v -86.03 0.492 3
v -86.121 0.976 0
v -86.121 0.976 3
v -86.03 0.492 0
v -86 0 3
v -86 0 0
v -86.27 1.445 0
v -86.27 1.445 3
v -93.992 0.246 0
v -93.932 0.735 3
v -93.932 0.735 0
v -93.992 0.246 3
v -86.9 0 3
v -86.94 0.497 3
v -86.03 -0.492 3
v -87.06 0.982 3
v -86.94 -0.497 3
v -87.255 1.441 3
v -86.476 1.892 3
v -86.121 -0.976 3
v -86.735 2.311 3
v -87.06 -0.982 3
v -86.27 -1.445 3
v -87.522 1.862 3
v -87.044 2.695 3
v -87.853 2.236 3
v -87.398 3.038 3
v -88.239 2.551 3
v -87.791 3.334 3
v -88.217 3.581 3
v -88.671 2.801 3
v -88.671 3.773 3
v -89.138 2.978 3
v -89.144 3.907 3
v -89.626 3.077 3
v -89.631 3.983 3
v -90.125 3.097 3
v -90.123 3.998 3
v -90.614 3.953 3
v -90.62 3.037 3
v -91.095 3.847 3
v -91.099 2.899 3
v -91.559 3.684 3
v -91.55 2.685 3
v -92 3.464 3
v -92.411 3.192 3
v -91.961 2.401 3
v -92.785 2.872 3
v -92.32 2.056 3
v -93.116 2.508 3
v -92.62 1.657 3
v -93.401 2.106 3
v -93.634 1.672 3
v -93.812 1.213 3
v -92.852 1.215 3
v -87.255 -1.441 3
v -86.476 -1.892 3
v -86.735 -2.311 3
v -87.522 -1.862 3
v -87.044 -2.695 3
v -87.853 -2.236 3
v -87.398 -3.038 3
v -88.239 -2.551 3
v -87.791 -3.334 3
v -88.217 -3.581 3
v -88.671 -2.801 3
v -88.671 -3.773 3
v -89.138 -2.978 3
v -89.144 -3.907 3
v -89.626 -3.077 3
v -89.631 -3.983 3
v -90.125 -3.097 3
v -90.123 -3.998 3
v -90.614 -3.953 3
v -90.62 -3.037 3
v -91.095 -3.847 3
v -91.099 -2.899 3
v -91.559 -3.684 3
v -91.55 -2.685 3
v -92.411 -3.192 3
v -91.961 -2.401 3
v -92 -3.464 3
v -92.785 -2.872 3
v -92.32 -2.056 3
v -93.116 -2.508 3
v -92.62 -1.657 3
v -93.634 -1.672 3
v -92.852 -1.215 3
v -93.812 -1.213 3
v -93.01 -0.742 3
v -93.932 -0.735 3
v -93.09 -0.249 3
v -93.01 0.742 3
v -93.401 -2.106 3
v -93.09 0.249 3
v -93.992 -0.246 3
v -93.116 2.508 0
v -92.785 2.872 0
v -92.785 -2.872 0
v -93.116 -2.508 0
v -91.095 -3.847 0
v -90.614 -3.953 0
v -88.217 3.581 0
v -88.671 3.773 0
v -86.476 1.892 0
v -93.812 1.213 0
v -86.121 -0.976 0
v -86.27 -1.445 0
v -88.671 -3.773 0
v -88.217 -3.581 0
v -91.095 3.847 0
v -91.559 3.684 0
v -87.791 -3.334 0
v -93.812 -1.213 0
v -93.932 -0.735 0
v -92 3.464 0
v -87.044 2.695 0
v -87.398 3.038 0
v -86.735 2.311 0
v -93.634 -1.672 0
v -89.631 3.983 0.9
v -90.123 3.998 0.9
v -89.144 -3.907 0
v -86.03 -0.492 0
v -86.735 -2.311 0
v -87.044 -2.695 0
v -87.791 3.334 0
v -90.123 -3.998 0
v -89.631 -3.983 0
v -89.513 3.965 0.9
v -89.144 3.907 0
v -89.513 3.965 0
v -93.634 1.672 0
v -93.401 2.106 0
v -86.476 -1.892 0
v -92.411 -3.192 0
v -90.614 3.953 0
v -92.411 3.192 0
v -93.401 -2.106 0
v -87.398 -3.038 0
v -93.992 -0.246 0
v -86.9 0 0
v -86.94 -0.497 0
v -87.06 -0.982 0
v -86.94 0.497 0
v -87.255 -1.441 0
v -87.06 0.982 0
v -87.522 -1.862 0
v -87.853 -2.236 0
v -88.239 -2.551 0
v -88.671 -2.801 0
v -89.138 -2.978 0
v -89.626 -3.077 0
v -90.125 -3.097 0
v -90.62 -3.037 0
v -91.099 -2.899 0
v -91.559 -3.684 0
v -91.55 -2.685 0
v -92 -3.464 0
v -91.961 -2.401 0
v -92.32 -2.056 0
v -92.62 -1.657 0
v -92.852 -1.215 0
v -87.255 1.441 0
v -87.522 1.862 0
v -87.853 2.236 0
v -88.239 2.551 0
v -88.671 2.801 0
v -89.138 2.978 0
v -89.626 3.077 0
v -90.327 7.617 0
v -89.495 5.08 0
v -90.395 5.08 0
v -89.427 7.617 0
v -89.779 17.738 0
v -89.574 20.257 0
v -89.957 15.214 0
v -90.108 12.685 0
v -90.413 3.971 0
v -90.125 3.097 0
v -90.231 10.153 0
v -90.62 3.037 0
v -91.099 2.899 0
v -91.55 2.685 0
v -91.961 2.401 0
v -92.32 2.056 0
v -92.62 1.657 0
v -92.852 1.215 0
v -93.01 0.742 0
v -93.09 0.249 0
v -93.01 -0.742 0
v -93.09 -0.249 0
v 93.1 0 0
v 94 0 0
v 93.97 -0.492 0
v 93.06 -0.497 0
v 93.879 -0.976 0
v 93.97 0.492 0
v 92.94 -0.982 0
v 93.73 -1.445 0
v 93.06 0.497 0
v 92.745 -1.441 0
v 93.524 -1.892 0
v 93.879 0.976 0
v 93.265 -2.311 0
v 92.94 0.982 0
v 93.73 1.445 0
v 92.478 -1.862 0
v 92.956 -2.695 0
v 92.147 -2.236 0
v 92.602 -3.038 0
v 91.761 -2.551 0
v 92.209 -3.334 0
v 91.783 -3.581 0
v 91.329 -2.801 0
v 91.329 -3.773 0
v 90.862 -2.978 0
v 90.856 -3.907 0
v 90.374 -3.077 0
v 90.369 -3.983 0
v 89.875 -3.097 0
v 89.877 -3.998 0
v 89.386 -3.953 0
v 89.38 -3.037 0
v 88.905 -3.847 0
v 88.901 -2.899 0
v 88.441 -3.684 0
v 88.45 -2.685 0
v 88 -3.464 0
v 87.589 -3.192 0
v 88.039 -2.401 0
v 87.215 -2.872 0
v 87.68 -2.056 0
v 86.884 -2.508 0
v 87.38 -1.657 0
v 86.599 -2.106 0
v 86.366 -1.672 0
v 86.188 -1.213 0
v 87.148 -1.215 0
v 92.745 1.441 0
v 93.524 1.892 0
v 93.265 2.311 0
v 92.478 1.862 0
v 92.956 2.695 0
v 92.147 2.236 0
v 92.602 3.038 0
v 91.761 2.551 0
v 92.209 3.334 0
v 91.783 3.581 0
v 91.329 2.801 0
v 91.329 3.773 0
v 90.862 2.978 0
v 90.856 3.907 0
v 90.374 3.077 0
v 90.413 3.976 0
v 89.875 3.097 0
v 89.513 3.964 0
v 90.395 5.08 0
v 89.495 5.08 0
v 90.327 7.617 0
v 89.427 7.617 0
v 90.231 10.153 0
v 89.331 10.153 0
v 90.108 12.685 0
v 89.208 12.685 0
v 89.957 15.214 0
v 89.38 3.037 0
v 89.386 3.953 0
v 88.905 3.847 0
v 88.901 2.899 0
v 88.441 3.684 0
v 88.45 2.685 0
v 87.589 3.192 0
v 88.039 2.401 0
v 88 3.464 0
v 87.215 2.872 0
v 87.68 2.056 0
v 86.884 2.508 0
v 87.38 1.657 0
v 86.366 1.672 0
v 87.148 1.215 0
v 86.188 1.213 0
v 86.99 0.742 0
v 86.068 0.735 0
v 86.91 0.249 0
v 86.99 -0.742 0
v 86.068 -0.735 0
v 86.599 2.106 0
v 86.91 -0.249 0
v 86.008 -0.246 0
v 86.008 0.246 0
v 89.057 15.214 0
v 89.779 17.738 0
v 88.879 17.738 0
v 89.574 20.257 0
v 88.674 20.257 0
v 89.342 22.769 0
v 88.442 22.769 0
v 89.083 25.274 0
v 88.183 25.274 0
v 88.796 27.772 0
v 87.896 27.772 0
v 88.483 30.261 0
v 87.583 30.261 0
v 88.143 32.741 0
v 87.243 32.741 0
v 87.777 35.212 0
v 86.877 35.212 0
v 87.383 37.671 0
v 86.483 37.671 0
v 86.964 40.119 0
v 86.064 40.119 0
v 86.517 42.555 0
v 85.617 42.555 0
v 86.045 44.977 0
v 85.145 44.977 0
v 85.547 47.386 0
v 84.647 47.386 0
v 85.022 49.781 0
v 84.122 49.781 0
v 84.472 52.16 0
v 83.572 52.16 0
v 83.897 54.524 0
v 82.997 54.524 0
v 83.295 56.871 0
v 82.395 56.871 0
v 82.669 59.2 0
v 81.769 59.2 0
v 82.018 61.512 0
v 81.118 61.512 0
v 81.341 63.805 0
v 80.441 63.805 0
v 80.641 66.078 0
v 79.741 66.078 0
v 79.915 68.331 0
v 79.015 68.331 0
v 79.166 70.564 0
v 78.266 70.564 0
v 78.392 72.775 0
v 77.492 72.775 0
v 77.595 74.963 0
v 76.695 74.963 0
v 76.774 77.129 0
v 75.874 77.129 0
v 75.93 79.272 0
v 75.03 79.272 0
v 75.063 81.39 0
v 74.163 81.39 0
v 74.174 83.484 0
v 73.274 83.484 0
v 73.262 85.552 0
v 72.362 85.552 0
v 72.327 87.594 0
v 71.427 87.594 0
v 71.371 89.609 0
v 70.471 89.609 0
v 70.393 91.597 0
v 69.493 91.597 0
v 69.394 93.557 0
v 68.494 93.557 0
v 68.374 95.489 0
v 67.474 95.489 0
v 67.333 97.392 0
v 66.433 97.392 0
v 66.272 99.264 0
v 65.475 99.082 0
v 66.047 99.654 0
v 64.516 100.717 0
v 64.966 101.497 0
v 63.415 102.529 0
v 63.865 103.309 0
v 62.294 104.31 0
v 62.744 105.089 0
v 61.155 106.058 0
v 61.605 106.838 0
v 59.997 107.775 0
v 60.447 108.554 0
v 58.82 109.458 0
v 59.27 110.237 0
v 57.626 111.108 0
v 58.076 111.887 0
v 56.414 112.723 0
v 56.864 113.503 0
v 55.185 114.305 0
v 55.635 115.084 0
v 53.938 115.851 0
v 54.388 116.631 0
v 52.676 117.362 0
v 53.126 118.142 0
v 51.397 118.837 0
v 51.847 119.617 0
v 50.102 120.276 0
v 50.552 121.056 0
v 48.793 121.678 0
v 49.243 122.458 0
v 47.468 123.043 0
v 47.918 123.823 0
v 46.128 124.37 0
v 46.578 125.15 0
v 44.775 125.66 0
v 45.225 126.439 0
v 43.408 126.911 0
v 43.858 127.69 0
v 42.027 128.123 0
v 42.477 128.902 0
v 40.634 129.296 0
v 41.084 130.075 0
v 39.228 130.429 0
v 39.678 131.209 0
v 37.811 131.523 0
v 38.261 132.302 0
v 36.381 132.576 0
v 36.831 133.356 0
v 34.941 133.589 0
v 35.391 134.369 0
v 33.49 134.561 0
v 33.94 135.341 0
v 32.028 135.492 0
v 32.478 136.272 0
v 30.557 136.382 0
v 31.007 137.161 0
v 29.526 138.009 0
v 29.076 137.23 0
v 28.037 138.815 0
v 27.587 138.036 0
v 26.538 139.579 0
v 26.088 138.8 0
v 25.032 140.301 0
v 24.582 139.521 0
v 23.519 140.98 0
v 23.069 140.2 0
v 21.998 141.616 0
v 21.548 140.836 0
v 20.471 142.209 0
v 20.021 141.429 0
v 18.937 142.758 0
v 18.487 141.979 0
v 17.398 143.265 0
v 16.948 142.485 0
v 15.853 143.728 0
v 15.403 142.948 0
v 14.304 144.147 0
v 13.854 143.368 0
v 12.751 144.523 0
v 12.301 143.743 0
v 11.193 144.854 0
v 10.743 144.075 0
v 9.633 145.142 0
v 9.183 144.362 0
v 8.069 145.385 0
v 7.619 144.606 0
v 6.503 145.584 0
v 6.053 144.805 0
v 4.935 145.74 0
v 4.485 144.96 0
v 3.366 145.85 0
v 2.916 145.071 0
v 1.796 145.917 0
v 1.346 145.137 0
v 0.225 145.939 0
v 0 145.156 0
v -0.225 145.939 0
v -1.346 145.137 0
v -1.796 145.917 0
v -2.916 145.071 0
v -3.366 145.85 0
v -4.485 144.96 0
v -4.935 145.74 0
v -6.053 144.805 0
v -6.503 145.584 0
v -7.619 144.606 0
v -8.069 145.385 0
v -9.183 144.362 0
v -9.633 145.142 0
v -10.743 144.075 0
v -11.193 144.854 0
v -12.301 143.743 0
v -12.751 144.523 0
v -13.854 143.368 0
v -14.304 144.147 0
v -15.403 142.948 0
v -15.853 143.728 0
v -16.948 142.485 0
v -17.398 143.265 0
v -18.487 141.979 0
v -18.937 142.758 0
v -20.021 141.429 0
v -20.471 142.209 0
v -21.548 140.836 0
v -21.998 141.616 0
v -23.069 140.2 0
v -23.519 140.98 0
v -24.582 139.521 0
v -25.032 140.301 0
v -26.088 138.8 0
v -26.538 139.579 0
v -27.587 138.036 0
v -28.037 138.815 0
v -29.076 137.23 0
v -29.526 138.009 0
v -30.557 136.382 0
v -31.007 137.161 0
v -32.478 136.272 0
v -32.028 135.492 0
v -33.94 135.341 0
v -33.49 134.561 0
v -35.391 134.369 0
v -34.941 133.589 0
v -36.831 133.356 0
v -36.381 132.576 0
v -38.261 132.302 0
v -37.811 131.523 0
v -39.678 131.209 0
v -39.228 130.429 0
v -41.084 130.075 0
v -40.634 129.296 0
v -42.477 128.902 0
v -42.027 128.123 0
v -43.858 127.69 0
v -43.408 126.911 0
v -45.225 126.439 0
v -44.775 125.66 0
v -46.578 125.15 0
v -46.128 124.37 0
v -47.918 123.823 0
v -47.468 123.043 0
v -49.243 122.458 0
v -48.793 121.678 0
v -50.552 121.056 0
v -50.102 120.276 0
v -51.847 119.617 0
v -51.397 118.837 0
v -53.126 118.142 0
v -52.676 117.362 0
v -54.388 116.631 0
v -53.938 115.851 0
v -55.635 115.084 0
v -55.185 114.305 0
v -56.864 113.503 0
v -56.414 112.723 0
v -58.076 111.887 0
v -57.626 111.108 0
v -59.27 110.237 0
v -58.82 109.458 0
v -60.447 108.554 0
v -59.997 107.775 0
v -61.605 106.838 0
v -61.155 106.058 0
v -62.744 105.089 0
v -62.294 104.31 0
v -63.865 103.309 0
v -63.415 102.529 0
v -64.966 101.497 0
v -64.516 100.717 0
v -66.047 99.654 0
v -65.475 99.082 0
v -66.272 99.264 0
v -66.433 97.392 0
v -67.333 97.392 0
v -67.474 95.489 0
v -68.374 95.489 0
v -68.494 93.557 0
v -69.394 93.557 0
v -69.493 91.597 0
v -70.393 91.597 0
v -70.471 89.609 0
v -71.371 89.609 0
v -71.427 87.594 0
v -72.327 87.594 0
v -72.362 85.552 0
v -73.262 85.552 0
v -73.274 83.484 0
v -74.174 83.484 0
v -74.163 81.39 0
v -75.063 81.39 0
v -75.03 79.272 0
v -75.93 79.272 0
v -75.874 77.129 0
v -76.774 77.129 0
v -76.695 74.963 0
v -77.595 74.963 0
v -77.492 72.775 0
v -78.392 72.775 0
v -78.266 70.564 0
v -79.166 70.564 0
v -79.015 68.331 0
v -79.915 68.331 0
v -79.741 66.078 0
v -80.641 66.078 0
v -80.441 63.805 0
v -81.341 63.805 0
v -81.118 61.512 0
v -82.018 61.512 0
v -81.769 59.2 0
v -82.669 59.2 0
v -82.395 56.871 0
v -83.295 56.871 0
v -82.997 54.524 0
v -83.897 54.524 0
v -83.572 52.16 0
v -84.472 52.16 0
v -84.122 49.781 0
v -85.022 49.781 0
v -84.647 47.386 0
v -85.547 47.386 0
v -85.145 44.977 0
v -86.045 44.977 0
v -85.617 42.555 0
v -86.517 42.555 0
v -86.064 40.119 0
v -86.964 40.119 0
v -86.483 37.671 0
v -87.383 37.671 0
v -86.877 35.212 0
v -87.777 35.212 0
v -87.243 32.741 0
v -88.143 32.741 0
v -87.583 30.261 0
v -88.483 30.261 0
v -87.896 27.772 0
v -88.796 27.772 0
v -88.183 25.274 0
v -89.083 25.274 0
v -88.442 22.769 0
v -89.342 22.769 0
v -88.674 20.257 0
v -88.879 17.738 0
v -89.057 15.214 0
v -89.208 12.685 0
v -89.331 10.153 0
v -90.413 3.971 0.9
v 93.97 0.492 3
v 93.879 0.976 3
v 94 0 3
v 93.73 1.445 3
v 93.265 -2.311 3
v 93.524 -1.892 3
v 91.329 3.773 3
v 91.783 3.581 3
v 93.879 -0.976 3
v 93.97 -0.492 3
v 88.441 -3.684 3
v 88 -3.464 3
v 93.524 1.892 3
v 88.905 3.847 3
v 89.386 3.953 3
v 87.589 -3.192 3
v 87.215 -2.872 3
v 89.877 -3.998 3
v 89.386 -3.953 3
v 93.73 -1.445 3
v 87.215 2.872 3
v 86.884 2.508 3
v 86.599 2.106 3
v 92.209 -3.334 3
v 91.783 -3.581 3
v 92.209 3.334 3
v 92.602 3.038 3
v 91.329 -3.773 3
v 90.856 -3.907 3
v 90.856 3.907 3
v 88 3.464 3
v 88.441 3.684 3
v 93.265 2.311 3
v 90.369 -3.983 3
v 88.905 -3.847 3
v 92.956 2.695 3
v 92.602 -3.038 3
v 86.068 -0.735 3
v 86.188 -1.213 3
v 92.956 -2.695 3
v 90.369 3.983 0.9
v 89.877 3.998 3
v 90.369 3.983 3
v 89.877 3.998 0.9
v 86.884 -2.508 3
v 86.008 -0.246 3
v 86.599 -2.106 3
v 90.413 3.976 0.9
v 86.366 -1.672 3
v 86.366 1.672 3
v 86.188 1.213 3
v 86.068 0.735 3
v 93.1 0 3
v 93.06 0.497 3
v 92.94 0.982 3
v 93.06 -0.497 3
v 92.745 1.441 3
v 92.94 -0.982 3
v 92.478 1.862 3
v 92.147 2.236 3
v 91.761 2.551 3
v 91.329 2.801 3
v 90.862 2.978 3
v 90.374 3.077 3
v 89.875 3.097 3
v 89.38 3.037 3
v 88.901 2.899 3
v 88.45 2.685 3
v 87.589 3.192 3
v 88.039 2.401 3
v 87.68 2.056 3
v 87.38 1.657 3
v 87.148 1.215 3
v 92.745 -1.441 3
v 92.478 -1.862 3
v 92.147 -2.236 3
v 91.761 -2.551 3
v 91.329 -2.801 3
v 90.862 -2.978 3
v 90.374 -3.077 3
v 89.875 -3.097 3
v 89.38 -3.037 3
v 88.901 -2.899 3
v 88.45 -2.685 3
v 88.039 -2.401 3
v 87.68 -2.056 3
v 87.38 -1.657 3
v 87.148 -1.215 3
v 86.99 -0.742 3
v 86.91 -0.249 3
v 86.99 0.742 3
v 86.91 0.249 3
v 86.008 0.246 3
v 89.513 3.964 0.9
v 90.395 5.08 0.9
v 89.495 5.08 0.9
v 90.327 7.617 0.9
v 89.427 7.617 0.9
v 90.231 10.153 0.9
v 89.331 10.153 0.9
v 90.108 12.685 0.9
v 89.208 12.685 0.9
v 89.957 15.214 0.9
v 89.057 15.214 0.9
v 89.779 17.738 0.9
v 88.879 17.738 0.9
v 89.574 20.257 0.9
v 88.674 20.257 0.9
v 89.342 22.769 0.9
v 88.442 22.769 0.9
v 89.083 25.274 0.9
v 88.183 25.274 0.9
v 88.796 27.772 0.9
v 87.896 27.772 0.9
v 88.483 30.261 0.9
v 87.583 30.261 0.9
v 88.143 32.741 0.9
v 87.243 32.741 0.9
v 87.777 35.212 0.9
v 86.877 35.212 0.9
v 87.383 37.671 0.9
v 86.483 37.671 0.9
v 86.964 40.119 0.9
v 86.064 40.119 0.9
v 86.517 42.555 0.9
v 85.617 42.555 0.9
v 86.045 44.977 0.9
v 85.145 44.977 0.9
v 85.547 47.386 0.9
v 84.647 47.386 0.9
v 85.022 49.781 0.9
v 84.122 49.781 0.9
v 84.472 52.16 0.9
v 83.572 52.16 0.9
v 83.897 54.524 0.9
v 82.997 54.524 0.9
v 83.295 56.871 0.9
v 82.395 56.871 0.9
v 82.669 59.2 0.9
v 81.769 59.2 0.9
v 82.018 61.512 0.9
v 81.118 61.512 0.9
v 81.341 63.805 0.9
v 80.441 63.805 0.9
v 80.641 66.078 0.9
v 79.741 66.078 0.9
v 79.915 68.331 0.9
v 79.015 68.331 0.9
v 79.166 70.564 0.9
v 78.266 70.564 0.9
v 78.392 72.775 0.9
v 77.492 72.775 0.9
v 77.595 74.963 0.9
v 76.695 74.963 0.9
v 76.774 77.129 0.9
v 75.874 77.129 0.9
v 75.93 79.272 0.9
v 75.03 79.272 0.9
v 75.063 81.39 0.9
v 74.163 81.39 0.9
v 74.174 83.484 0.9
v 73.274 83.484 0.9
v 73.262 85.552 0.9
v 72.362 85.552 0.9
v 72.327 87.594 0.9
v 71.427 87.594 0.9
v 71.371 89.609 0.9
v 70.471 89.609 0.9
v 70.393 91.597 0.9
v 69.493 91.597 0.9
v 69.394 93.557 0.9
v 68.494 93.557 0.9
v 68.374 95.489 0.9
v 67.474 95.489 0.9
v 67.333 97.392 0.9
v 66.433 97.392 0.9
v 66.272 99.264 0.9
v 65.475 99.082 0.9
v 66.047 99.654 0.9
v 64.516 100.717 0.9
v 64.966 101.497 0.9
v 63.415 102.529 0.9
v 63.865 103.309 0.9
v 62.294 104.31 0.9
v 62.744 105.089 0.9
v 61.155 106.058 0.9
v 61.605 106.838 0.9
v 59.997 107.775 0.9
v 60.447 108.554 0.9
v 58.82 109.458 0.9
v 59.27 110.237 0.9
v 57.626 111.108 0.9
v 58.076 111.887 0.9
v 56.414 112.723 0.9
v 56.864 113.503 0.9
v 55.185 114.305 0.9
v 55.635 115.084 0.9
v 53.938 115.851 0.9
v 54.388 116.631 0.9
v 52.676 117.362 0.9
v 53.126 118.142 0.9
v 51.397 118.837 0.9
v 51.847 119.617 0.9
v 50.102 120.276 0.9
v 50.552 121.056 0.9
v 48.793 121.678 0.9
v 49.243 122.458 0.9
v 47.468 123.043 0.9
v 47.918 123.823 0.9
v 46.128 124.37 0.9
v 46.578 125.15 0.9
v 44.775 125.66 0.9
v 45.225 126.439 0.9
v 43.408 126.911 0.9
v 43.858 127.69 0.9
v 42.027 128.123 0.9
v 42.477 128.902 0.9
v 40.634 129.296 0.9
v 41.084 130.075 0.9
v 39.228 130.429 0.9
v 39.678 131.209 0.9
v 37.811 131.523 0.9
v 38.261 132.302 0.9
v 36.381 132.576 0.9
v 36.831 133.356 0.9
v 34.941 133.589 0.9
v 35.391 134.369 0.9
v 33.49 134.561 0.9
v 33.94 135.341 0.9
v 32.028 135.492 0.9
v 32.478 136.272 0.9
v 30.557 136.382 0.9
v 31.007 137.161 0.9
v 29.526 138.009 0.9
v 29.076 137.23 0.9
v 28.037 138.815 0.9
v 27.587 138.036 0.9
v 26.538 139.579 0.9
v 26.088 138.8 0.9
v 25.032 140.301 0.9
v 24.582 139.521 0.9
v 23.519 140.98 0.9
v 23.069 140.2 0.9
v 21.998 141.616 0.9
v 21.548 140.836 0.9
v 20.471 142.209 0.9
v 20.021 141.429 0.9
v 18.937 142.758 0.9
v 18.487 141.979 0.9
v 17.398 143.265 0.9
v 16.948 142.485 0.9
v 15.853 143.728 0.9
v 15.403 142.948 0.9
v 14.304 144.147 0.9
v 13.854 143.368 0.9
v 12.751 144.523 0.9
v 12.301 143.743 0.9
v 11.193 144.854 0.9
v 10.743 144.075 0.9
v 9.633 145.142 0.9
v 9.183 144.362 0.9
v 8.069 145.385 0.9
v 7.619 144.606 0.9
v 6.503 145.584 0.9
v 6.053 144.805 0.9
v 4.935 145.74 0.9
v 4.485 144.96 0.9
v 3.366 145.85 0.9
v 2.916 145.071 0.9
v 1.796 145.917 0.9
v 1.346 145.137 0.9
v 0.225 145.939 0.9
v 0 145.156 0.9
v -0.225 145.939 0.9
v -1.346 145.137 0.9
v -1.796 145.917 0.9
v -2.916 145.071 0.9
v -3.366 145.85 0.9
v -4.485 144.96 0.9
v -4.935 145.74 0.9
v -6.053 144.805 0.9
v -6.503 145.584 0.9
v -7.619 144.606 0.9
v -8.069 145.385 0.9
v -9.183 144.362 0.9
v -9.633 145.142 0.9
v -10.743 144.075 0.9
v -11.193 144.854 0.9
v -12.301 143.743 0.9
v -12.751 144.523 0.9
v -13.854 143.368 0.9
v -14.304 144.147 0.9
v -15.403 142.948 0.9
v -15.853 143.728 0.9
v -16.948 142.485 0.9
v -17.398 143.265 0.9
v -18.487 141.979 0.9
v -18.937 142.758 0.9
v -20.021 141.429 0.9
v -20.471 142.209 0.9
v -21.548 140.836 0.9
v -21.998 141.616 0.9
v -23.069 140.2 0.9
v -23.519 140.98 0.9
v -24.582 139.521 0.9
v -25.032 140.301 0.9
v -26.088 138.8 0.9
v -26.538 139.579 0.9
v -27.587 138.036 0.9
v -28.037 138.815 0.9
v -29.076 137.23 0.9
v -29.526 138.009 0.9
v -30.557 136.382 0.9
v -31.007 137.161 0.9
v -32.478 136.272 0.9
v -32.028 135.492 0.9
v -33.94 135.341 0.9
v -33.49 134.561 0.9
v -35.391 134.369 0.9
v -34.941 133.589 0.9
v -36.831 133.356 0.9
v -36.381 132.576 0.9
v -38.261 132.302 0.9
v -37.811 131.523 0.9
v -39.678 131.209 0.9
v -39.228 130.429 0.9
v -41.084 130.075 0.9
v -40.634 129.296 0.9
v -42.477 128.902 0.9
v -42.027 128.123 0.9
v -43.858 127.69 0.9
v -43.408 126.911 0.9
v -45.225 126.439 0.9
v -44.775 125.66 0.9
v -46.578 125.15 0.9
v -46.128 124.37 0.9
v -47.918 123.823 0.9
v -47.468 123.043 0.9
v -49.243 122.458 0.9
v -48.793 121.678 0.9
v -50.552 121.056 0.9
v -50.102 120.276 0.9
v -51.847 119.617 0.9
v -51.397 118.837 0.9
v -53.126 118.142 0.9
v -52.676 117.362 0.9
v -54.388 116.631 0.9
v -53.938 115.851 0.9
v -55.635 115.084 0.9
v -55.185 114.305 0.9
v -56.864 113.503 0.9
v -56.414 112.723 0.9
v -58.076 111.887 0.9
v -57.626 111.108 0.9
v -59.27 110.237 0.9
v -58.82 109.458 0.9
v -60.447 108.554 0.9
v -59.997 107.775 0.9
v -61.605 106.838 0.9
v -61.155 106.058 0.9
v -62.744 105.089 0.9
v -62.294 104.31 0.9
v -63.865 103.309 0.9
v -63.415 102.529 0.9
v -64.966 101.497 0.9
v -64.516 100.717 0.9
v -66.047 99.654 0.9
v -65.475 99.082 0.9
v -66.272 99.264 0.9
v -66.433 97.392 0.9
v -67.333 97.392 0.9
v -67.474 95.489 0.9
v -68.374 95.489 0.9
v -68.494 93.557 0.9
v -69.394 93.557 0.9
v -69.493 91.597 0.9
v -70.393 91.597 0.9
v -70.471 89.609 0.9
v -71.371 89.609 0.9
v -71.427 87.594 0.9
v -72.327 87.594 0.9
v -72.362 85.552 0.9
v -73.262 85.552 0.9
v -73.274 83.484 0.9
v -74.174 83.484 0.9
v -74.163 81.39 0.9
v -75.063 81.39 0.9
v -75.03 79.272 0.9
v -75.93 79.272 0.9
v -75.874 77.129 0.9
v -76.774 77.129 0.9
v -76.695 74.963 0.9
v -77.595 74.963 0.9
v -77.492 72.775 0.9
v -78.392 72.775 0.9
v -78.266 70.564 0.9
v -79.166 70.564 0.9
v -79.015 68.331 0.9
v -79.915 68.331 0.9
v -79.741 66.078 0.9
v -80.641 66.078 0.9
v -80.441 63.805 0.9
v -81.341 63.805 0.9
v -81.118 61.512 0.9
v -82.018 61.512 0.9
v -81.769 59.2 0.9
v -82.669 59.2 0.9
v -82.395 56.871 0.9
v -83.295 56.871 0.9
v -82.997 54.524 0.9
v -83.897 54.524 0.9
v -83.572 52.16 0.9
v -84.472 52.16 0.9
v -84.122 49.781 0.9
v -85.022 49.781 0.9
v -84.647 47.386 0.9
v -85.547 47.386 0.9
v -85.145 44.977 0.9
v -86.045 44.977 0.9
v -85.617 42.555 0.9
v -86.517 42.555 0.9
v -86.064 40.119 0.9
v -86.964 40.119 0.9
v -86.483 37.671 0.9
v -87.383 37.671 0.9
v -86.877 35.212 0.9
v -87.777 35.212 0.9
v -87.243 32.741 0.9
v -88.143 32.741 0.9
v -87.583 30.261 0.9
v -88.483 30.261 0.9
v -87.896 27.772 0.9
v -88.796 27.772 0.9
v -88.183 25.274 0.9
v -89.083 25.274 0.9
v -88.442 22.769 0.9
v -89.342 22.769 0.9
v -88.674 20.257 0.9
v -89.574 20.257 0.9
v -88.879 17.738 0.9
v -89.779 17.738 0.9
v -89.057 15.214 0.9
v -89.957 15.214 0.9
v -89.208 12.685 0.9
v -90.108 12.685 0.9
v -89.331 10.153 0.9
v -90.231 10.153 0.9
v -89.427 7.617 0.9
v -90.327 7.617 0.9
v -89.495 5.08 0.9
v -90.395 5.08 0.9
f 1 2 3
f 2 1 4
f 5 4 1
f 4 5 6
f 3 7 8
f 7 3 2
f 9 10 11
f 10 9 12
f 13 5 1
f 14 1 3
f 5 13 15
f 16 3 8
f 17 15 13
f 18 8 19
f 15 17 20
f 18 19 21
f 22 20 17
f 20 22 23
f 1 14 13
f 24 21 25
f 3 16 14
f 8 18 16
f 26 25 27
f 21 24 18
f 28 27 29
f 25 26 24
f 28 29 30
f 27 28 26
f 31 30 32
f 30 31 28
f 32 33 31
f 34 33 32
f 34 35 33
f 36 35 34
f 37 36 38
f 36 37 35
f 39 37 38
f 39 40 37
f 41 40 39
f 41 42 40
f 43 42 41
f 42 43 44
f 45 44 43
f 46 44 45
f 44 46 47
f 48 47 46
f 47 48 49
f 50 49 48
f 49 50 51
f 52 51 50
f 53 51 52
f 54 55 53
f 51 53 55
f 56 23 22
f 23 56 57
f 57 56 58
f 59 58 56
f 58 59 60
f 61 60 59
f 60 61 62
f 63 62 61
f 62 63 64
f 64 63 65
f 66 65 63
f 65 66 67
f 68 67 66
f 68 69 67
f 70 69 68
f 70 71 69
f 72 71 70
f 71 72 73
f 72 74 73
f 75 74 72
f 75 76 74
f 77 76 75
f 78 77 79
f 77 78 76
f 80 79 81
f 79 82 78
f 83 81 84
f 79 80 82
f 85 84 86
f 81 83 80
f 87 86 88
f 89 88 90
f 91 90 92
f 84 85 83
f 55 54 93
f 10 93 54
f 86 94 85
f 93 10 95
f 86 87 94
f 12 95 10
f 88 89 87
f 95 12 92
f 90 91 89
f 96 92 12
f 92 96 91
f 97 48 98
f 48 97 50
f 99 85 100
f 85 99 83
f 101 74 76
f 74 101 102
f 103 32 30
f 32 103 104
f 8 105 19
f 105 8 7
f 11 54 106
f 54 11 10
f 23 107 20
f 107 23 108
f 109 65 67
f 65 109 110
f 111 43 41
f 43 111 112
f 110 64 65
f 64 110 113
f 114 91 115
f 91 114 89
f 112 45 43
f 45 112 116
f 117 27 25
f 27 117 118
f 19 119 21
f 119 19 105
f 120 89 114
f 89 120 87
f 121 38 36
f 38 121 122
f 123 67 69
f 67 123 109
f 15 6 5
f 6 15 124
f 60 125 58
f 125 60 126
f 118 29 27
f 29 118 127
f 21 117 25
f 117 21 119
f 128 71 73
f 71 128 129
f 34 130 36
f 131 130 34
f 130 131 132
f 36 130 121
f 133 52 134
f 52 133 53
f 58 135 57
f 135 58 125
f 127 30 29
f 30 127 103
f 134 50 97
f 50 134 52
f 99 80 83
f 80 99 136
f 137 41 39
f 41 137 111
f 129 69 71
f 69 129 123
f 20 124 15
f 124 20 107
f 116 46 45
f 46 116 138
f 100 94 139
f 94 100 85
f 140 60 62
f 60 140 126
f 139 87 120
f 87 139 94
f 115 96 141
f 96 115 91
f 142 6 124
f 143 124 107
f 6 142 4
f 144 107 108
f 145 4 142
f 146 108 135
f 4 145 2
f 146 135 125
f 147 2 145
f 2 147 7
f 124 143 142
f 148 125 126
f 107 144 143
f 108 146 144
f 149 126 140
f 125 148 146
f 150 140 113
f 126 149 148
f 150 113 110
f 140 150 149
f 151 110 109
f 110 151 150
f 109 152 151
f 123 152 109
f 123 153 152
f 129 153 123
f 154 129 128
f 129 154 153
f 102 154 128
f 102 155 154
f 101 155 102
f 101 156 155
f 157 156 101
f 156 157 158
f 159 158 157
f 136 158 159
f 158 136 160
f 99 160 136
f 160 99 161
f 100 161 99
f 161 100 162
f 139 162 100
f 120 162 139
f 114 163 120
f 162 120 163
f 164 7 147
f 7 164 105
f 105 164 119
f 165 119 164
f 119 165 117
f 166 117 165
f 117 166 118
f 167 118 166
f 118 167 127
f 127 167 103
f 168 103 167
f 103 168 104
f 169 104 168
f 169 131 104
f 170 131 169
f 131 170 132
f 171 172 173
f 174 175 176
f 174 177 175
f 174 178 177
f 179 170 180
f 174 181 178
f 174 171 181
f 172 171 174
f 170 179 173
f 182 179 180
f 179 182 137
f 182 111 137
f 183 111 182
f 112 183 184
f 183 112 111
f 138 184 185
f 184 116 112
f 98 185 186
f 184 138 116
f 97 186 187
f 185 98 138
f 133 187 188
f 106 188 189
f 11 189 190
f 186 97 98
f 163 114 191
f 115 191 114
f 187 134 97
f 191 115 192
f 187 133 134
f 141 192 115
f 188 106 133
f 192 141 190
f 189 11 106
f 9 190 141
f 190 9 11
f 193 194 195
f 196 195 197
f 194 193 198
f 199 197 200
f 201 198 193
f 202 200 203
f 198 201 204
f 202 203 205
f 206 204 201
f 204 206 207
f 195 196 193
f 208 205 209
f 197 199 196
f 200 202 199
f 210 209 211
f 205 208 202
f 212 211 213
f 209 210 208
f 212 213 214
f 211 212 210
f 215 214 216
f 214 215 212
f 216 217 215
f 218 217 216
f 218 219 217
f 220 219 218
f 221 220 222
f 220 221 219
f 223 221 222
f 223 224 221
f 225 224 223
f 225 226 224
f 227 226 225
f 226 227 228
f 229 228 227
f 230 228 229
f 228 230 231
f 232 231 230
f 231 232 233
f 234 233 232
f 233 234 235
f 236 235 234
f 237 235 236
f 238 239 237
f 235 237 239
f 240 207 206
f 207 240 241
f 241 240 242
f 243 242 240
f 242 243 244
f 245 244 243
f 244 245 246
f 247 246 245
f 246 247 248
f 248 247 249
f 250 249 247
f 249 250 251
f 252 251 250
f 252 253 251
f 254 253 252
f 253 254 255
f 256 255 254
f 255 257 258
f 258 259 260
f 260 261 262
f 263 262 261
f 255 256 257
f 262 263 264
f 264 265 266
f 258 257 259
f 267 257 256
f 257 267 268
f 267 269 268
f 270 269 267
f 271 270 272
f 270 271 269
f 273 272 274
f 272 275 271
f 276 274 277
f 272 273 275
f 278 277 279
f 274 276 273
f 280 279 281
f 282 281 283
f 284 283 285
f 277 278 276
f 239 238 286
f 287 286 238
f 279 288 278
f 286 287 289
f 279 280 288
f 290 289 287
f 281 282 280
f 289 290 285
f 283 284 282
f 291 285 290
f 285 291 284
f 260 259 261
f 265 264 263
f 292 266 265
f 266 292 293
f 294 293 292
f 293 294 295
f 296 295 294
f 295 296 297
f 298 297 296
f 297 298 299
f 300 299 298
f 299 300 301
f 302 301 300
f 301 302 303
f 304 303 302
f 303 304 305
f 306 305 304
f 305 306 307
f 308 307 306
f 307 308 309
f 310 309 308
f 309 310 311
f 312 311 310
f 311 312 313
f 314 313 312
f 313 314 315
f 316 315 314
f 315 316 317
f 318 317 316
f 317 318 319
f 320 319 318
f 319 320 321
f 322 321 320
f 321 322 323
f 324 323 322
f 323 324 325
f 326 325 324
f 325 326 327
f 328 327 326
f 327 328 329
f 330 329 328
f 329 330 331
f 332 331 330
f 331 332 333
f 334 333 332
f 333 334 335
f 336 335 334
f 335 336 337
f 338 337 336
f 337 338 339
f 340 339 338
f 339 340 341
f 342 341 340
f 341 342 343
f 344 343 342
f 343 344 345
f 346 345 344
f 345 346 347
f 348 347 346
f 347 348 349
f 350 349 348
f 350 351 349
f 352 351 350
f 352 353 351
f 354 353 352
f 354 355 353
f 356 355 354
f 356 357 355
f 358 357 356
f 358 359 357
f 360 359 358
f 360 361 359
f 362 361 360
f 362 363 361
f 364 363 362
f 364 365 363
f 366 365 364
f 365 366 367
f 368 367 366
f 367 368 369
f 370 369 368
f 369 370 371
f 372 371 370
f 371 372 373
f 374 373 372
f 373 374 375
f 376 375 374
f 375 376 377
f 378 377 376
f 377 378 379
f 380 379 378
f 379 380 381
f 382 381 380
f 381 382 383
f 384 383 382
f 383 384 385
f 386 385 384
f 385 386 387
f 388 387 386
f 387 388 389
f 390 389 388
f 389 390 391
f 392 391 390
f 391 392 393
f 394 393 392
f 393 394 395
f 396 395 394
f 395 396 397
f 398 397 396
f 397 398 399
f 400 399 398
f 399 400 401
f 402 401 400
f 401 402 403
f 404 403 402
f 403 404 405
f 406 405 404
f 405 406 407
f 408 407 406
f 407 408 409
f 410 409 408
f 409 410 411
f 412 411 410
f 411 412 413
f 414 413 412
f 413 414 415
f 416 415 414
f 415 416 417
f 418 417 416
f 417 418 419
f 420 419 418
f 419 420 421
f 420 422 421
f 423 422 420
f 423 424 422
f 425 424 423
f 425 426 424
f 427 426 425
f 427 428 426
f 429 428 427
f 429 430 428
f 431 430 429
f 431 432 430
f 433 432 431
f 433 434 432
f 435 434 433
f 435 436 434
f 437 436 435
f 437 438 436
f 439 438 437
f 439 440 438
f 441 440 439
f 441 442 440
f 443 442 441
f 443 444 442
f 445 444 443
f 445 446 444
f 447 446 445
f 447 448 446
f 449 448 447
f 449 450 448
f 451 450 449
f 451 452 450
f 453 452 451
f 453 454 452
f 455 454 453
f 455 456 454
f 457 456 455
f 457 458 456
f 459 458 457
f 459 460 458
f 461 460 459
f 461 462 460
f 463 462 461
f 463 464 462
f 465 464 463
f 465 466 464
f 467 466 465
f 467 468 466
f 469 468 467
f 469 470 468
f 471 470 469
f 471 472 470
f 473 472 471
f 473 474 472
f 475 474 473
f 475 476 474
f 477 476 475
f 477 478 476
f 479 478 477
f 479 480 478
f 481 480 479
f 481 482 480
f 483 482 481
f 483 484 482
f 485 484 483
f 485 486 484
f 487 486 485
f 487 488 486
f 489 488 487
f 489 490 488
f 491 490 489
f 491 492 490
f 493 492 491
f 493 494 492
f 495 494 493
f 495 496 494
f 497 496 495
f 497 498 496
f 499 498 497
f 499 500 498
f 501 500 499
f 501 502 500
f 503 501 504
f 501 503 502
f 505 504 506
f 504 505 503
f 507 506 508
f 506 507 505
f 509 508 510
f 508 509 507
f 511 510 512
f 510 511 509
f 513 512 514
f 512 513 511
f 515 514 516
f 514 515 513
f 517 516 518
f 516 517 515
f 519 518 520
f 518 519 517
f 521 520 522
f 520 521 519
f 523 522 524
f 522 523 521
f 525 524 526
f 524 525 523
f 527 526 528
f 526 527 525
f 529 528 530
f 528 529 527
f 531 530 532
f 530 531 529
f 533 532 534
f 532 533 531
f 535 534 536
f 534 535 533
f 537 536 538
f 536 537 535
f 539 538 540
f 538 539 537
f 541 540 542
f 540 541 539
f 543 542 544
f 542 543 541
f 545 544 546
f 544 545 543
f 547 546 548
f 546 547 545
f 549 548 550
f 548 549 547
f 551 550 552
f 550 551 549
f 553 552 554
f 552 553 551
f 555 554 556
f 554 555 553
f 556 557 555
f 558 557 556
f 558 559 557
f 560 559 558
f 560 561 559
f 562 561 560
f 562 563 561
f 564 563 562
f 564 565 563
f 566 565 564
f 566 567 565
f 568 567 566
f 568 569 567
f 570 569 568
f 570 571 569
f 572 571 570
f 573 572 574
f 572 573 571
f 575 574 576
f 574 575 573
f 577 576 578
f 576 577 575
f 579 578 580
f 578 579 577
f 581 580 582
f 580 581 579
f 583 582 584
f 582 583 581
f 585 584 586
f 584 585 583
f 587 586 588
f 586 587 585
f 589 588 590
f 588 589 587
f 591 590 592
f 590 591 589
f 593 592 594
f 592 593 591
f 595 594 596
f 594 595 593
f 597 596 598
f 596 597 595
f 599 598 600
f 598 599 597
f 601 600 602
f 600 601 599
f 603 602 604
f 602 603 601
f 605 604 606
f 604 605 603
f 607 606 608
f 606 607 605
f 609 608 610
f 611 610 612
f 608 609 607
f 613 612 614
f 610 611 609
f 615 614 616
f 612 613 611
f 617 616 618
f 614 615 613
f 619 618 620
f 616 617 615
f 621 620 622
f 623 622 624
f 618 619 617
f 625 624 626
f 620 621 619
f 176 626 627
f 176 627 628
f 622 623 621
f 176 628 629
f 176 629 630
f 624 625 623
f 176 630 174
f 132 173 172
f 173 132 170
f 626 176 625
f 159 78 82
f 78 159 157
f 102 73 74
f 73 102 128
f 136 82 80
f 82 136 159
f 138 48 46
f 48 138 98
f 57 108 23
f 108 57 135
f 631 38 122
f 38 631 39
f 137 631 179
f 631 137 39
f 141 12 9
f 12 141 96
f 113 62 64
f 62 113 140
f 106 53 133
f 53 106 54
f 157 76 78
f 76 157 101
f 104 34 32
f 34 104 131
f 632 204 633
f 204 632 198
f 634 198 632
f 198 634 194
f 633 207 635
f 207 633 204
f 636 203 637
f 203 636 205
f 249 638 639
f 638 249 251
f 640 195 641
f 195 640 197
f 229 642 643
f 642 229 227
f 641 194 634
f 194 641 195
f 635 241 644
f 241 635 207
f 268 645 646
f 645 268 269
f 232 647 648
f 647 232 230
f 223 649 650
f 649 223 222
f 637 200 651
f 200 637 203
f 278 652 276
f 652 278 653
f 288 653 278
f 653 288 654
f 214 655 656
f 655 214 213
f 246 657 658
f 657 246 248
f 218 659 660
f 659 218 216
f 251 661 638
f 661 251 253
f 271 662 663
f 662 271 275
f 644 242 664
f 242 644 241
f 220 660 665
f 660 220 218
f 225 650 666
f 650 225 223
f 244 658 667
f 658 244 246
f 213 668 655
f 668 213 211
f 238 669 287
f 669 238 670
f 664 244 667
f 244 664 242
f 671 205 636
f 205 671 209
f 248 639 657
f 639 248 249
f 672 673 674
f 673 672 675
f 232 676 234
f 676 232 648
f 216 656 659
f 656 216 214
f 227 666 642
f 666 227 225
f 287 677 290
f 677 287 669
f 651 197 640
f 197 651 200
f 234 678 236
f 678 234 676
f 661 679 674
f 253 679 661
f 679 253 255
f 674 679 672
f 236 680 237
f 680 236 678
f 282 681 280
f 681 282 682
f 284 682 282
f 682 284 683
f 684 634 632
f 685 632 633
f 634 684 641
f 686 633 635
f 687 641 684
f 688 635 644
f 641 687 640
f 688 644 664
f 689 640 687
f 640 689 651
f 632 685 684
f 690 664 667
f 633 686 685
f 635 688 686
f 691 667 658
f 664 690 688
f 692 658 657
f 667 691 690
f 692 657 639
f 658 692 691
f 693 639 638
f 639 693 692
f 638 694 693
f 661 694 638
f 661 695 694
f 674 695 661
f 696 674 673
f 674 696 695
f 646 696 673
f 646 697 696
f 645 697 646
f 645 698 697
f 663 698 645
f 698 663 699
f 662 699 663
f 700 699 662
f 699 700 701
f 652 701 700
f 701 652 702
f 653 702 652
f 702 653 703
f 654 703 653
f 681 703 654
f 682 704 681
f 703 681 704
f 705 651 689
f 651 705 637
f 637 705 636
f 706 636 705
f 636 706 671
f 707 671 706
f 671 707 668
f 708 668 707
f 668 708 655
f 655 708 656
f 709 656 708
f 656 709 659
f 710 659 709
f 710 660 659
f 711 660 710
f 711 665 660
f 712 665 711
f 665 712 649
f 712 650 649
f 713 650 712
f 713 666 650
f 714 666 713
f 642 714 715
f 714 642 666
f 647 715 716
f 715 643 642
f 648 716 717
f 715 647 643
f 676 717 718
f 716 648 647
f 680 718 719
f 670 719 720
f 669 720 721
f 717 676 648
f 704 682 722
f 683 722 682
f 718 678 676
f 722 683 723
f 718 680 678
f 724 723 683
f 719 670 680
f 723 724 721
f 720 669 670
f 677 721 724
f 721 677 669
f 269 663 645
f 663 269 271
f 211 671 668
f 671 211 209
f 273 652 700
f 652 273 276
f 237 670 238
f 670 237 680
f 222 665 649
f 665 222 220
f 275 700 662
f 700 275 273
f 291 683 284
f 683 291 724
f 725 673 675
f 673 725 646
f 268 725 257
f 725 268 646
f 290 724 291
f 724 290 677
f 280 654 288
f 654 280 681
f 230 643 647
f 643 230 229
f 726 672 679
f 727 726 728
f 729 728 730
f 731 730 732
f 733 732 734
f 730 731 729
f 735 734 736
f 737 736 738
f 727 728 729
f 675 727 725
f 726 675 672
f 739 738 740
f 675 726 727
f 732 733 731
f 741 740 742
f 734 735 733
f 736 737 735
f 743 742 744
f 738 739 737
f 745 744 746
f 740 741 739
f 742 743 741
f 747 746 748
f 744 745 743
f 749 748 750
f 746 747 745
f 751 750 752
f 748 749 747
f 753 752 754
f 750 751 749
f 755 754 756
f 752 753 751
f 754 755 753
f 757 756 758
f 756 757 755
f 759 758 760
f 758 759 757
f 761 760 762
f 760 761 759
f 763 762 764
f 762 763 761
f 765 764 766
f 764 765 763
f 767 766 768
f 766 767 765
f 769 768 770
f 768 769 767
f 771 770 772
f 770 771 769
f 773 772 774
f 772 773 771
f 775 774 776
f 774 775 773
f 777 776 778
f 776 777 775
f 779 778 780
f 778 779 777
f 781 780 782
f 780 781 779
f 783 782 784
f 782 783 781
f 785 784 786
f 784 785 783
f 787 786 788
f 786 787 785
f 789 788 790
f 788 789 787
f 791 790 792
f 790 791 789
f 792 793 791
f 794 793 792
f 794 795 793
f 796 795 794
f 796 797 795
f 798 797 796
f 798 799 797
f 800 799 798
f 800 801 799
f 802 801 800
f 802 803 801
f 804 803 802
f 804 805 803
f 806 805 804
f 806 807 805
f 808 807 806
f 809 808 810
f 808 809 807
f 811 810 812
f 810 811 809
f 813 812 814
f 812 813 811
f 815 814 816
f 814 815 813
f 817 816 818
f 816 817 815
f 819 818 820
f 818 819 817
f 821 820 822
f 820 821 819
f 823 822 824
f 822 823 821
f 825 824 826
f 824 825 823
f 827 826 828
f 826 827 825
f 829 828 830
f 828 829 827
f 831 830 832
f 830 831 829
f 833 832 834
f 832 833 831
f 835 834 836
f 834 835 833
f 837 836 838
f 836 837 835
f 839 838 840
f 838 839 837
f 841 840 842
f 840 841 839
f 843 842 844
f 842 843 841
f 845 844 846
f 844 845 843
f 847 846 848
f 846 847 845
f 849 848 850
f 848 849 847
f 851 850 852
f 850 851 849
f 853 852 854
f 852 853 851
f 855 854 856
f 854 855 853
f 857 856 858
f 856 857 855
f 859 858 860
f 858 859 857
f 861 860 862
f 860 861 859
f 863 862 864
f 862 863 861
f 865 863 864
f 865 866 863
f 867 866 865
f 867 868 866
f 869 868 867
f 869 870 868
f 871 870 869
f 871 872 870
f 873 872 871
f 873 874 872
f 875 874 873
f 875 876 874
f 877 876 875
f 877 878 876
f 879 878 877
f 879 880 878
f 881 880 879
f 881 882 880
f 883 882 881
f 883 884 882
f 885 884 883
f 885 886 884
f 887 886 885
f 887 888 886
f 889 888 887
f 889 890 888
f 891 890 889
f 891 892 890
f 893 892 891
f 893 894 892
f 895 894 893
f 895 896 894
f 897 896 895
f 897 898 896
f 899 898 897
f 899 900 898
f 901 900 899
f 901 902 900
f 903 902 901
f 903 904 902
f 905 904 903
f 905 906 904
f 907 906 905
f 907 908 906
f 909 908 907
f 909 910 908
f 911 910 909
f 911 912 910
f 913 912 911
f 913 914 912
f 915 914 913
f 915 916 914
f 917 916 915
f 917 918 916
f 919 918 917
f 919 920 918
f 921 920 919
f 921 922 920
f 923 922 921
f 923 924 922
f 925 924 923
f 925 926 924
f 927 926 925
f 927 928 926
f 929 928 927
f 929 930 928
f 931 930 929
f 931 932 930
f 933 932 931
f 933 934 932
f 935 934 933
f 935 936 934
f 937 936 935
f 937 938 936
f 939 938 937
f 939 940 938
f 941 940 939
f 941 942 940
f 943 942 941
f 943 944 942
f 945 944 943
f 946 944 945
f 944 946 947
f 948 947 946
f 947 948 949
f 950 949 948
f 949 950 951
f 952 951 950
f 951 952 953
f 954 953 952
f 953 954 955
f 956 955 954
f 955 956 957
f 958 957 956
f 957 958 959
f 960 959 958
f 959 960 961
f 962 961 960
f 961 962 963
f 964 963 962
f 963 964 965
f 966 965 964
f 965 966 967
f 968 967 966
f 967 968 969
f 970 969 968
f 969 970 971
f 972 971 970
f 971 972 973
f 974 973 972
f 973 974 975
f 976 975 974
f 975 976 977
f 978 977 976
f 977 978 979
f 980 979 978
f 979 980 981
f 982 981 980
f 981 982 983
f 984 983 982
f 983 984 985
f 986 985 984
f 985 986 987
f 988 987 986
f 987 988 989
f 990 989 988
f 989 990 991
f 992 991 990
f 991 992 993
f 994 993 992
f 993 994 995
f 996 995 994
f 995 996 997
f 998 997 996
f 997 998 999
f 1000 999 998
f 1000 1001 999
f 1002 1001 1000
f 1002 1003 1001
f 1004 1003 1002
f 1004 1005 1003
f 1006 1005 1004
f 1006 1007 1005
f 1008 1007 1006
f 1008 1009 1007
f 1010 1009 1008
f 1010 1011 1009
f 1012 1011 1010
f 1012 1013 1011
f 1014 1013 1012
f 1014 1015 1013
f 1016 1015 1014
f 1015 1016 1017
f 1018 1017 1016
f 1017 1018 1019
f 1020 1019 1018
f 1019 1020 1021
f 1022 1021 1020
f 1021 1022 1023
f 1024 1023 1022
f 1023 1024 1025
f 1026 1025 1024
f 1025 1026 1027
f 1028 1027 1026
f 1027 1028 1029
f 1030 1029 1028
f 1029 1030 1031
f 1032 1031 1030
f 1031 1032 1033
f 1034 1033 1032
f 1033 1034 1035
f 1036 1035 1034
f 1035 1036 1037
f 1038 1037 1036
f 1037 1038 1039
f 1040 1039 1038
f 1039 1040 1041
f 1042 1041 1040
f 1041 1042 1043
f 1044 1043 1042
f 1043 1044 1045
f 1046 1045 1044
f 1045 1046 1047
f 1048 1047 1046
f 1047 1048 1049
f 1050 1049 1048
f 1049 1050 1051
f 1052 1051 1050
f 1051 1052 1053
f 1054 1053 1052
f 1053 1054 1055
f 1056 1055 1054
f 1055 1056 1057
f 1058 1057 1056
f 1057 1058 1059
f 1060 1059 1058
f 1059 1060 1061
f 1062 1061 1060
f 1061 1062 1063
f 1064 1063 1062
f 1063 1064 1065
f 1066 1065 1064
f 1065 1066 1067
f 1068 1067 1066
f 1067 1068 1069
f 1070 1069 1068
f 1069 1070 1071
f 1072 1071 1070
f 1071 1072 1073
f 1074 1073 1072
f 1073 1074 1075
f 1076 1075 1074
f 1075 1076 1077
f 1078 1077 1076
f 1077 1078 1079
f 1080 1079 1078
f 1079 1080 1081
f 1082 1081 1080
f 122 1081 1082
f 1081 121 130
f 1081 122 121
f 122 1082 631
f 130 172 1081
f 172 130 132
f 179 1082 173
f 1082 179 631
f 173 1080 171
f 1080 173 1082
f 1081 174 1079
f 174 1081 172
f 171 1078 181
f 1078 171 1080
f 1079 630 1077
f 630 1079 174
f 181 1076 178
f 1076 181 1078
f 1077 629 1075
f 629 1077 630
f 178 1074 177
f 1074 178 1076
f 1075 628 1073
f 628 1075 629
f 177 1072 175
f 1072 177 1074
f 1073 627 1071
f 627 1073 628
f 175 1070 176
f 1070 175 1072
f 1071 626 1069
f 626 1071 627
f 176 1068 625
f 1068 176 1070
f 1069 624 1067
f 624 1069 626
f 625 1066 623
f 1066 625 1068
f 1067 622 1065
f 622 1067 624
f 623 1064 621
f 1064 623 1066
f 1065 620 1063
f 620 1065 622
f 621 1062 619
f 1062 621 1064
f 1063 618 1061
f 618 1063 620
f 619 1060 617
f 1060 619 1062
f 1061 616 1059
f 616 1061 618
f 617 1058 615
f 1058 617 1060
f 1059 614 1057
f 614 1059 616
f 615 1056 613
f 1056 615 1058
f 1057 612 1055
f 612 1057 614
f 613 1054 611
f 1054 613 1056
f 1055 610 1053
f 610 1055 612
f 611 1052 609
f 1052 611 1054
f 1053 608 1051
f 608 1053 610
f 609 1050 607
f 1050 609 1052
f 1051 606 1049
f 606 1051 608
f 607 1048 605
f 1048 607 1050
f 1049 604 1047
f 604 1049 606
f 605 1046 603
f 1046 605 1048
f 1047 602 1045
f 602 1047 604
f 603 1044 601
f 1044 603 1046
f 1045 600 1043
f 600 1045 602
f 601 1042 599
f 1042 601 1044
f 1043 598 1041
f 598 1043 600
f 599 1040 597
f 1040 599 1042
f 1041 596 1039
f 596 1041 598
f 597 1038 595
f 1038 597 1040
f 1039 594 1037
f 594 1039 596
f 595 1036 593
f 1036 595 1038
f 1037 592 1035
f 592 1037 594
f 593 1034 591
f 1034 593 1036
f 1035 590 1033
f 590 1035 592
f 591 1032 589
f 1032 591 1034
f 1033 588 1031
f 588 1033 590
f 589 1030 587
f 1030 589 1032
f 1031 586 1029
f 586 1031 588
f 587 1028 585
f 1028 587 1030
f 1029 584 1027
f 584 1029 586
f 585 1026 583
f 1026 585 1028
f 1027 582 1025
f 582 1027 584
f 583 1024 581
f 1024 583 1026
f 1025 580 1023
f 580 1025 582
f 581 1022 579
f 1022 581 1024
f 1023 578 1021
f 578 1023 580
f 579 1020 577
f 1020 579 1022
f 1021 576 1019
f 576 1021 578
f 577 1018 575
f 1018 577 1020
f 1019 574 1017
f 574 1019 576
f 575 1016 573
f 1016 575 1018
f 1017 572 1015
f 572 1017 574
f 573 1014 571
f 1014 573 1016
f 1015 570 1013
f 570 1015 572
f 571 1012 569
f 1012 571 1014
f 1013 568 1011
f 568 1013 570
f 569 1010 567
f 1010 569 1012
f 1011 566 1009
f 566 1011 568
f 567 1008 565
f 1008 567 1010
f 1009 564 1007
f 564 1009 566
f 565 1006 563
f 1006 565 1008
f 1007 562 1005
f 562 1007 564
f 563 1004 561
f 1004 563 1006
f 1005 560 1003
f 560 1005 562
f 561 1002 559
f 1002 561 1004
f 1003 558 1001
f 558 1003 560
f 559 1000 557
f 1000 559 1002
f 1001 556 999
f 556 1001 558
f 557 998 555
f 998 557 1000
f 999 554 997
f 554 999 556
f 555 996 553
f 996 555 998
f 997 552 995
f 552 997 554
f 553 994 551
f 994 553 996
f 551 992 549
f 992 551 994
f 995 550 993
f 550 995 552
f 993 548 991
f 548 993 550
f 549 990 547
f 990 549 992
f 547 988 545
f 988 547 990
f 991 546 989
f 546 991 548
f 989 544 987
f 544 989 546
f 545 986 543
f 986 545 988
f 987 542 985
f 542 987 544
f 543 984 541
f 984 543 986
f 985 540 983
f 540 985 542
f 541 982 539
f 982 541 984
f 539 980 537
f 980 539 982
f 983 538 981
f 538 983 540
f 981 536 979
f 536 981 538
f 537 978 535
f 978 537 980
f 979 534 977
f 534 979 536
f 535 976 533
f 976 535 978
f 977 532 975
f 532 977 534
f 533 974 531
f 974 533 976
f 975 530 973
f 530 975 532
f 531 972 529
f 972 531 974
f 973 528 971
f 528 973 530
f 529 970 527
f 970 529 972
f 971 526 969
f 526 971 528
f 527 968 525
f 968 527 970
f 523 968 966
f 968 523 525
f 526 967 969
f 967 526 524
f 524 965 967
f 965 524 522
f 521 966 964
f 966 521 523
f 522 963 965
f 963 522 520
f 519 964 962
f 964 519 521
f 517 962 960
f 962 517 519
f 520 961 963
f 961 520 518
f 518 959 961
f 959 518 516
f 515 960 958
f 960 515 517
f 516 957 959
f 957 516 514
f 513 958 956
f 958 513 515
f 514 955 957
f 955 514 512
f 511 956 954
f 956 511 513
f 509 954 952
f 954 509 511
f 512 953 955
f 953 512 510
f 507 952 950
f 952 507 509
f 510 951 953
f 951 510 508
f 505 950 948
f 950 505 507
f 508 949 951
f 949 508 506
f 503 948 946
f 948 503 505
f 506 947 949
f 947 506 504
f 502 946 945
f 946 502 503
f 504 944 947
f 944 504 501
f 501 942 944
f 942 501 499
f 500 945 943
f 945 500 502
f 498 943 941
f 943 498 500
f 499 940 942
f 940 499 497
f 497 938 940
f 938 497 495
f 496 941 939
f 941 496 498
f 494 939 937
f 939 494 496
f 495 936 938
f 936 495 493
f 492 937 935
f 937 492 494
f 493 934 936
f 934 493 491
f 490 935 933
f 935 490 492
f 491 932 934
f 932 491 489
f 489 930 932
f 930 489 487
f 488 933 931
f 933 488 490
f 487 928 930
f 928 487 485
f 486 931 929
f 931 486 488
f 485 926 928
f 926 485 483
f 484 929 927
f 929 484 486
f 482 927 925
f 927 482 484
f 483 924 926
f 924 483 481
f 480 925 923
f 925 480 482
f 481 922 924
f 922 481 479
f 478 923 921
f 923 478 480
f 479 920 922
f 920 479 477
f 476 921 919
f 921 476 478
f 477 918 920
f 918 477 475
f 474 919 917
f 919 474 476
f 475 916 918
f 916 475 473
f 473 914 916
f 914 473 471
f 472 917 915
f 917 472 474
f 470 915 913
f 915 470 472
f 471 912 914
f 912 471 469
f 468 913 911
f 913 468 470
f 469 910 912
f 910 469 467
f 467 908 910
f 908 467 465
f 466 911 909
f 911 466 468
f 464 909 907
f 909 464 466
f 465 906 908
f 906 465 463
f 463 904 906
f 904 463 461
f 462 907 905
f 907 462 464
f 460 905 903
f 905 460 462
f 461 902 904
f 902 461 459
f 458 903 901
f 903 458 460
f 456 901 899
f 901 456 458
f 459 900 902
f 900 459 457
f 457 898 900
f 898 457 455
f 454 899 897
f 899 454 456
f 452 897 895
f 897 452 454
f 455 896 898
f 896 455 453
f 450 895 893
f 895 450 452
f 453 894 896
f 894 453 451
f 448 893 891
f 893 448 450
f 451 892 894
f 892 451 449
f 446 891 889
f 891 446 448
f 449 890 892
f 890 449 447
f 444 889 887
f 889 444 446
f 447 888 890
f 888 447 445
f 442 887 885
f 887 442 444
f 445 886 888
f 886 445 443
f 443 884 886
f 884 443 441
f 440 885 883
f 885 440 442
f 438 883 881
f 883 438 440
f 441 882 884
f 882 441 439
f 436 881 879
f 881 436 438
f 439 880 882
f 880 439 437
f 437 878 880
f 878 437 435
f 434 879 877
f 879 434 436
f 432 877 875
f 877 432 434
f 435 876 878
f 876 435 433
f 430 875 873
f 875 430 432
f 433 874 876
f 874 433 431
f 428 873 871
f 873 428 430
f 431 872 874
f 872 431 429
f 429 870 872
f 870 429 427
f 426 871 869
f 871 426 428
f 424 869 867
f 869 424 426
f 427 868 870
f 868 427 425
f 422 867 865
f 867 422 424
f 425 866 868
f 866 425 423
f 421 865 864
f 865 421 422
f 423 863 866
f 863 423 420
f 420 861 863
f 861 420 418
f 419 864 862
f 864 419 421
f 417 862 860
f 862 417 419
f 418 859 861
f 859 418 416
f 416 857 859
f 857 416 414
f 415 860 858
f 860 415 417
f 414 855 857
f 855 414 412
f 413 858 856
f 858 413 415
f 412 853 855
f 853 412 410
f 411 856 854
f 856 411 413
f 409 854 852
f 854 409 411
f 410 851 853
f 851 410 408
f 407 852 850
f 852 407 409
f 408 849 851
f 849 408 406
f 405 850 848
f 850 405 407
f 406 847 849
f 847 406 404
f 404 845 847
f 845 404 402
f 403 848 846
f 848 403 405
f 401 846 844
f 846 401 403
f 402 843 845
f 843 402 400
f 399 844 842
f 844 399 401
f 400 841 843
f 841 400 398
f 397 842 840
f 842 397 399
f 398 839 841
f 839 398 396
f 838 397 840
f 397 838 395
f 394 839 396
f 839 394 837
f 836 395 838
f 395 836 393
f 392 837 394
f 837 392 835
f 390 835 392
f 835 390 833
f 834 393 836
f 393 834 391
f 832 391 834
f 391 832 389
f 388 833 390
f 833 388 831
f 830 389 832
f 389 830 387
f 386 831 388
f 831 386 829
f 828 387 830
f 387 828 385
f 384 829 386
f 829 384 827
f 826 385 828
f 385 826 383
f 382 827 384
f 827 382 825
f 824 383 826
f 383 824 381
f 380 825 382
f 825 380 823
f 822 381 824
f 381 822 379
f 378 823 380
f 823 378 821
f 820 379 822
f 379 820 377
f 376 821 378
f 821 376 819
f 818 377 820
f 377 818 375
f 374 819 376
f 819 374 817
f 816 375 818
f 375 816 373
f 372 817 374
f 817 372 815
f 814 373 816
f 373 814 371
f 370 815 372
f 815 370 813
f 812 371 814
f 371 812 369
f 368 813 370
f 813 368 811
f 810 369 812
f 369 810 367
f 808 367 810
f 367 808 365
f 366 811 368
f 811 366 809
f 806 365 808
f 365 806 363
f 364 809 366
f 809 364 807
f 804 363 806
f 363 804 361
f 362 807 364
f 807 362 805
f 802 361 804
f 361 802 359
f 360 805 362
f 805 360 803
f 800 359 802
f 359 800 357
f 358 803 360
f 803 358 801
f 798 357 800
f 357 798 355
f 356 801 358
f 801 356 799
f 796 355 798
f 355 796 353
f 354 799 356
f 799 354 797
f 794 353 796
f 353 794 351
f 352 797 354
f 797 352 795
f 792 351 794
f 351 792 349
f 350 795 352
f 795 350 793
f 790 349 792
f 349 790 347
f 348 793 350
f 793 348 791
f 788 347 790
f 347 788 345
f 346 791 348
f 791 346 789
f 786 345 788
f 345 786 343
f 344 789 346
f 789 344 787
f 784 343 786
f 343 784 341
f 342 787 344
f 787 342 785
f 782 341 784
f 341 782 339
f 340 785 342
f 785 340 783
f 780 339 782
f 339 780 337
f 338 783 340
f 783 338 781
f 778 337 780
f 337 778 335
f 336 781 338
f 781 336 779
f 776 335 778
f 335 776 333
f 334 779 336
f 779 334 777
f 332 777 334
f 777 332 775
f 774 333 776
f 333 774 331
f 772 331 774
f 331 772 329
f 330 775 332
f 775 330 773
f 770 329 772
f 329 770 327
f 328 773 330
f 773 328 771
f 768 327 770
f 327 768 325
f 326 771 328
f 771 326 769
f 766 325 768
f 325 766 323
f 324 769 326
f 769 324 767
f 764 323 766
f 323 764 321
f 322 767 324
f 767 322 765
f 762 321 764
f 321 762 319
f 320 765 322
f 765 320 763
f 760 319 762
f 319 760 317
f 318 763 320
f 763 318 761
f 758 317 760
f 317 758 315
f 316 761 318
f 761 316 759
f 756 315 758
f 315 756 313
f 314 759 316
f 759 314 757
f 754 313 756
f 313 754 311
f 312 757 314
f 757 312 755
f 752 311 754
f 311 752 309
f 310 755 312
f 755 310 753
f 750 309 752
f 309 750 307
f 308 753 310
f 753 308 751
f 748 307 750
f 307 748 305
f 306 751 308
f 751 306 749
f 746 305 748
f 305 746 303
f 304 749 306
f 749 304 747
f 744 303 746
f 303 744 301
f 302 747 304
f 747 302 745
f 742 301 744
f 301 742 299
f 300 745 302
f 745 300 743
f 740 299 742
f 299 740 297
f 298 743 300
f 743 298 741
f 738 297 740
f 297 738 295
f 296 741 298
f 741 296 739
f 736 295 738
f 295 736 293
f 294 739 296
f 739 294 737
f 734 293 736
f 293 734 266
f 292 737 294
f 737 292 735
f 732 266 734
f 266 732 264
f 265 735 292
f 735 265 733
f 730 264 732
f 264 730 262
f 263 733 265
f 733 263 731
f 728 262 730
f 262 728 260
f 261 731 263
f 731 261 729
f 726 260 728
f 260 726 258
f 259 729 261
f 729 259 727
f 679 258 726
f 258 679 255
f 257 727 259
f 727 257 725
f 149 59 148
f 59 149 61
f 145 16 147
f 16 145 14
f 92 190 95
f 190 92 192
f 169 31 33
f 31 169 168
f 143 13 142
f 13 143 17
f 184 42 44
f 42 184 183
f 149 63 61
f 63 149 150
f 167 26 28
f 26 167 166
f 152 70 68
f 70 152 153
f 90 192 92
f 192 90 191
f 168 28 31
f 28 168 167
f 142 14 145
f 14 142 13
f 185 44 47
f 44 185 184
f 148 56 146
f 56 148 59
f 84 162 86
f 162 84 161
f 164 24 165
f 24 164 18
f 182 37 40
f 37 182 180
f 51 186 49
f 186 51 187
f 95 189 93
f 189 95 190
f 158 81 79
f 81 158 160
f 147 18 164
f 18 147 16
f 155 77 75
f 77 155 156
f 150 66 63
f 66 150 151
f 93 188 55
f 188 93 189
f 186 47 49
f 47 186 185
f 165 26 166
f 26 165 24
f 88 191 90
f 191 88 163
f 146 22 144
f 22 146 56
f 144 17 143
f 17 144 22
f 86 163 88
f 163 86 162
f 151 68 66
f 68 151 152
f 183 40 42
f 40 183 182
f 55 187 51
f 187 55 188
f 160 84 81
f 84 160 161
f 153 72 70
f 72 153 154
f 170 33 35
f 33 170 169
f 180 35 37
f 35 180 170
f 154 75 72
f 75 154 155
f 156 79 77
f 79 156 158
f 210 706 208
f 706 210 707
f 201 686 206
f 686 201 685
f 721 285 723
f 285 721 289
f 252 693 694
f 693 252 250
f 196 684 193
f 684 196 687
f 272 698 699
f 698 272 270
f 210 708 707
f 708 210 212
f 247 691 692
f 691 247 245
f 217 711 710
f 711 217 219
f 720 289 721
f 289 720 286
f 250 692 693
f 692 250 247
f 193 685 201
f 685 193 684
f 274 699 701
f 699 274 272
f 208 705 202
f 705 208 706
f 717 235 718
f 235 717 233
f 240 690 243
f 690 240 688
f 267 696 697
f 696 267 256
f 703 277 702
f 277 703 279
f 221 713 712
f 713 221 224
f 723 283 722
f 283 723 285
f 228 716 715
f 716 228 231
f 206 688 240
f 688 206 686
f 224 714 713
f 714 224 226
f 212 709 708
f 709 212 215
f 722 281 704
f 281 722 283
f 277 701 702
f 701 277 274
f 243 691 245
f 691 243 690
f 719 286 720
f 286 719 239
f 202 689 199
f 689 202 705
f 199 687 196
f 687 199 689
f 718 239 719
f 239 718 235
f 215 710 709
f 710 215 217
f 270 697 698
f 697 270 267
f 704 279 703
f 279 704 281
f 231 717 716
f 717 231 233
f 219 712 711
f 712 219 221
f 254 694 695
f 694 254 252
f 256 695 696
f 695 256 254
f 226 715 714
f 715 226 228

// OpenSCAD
length = 370;		// [200:10:500]
thickness = 0.9;	// [0.4:0.05:3]


/* [Hidden] */

$fa=2;
$fs=0.5;
e = 0.01;

h = 3;
th = thickness;
d = 6.2;
step = 1;	

a = 90;
b = length * 2/PI - a;	// Raw estimation.

difference()
{
	union()
	{
		for (x = [-a, a])
			translate([x, 0, 0]) cylinder(h, d=d+2*th);

		for (ang = [-90:step:90-step])
		{
			hull()
			{
				translate([sin(ang) * a, cos(ang) * b, 0]) cylinder(th, d=th);
				translate([sin(ang+step) * a, cos(ang+step) * b, 0]) cylinder(th, d=th);
			}
		}
	}

	for (x = [-a, a])
		translate([x, 0, -e]) cylinder(h+2*e, d=d);
}
	
	
	
